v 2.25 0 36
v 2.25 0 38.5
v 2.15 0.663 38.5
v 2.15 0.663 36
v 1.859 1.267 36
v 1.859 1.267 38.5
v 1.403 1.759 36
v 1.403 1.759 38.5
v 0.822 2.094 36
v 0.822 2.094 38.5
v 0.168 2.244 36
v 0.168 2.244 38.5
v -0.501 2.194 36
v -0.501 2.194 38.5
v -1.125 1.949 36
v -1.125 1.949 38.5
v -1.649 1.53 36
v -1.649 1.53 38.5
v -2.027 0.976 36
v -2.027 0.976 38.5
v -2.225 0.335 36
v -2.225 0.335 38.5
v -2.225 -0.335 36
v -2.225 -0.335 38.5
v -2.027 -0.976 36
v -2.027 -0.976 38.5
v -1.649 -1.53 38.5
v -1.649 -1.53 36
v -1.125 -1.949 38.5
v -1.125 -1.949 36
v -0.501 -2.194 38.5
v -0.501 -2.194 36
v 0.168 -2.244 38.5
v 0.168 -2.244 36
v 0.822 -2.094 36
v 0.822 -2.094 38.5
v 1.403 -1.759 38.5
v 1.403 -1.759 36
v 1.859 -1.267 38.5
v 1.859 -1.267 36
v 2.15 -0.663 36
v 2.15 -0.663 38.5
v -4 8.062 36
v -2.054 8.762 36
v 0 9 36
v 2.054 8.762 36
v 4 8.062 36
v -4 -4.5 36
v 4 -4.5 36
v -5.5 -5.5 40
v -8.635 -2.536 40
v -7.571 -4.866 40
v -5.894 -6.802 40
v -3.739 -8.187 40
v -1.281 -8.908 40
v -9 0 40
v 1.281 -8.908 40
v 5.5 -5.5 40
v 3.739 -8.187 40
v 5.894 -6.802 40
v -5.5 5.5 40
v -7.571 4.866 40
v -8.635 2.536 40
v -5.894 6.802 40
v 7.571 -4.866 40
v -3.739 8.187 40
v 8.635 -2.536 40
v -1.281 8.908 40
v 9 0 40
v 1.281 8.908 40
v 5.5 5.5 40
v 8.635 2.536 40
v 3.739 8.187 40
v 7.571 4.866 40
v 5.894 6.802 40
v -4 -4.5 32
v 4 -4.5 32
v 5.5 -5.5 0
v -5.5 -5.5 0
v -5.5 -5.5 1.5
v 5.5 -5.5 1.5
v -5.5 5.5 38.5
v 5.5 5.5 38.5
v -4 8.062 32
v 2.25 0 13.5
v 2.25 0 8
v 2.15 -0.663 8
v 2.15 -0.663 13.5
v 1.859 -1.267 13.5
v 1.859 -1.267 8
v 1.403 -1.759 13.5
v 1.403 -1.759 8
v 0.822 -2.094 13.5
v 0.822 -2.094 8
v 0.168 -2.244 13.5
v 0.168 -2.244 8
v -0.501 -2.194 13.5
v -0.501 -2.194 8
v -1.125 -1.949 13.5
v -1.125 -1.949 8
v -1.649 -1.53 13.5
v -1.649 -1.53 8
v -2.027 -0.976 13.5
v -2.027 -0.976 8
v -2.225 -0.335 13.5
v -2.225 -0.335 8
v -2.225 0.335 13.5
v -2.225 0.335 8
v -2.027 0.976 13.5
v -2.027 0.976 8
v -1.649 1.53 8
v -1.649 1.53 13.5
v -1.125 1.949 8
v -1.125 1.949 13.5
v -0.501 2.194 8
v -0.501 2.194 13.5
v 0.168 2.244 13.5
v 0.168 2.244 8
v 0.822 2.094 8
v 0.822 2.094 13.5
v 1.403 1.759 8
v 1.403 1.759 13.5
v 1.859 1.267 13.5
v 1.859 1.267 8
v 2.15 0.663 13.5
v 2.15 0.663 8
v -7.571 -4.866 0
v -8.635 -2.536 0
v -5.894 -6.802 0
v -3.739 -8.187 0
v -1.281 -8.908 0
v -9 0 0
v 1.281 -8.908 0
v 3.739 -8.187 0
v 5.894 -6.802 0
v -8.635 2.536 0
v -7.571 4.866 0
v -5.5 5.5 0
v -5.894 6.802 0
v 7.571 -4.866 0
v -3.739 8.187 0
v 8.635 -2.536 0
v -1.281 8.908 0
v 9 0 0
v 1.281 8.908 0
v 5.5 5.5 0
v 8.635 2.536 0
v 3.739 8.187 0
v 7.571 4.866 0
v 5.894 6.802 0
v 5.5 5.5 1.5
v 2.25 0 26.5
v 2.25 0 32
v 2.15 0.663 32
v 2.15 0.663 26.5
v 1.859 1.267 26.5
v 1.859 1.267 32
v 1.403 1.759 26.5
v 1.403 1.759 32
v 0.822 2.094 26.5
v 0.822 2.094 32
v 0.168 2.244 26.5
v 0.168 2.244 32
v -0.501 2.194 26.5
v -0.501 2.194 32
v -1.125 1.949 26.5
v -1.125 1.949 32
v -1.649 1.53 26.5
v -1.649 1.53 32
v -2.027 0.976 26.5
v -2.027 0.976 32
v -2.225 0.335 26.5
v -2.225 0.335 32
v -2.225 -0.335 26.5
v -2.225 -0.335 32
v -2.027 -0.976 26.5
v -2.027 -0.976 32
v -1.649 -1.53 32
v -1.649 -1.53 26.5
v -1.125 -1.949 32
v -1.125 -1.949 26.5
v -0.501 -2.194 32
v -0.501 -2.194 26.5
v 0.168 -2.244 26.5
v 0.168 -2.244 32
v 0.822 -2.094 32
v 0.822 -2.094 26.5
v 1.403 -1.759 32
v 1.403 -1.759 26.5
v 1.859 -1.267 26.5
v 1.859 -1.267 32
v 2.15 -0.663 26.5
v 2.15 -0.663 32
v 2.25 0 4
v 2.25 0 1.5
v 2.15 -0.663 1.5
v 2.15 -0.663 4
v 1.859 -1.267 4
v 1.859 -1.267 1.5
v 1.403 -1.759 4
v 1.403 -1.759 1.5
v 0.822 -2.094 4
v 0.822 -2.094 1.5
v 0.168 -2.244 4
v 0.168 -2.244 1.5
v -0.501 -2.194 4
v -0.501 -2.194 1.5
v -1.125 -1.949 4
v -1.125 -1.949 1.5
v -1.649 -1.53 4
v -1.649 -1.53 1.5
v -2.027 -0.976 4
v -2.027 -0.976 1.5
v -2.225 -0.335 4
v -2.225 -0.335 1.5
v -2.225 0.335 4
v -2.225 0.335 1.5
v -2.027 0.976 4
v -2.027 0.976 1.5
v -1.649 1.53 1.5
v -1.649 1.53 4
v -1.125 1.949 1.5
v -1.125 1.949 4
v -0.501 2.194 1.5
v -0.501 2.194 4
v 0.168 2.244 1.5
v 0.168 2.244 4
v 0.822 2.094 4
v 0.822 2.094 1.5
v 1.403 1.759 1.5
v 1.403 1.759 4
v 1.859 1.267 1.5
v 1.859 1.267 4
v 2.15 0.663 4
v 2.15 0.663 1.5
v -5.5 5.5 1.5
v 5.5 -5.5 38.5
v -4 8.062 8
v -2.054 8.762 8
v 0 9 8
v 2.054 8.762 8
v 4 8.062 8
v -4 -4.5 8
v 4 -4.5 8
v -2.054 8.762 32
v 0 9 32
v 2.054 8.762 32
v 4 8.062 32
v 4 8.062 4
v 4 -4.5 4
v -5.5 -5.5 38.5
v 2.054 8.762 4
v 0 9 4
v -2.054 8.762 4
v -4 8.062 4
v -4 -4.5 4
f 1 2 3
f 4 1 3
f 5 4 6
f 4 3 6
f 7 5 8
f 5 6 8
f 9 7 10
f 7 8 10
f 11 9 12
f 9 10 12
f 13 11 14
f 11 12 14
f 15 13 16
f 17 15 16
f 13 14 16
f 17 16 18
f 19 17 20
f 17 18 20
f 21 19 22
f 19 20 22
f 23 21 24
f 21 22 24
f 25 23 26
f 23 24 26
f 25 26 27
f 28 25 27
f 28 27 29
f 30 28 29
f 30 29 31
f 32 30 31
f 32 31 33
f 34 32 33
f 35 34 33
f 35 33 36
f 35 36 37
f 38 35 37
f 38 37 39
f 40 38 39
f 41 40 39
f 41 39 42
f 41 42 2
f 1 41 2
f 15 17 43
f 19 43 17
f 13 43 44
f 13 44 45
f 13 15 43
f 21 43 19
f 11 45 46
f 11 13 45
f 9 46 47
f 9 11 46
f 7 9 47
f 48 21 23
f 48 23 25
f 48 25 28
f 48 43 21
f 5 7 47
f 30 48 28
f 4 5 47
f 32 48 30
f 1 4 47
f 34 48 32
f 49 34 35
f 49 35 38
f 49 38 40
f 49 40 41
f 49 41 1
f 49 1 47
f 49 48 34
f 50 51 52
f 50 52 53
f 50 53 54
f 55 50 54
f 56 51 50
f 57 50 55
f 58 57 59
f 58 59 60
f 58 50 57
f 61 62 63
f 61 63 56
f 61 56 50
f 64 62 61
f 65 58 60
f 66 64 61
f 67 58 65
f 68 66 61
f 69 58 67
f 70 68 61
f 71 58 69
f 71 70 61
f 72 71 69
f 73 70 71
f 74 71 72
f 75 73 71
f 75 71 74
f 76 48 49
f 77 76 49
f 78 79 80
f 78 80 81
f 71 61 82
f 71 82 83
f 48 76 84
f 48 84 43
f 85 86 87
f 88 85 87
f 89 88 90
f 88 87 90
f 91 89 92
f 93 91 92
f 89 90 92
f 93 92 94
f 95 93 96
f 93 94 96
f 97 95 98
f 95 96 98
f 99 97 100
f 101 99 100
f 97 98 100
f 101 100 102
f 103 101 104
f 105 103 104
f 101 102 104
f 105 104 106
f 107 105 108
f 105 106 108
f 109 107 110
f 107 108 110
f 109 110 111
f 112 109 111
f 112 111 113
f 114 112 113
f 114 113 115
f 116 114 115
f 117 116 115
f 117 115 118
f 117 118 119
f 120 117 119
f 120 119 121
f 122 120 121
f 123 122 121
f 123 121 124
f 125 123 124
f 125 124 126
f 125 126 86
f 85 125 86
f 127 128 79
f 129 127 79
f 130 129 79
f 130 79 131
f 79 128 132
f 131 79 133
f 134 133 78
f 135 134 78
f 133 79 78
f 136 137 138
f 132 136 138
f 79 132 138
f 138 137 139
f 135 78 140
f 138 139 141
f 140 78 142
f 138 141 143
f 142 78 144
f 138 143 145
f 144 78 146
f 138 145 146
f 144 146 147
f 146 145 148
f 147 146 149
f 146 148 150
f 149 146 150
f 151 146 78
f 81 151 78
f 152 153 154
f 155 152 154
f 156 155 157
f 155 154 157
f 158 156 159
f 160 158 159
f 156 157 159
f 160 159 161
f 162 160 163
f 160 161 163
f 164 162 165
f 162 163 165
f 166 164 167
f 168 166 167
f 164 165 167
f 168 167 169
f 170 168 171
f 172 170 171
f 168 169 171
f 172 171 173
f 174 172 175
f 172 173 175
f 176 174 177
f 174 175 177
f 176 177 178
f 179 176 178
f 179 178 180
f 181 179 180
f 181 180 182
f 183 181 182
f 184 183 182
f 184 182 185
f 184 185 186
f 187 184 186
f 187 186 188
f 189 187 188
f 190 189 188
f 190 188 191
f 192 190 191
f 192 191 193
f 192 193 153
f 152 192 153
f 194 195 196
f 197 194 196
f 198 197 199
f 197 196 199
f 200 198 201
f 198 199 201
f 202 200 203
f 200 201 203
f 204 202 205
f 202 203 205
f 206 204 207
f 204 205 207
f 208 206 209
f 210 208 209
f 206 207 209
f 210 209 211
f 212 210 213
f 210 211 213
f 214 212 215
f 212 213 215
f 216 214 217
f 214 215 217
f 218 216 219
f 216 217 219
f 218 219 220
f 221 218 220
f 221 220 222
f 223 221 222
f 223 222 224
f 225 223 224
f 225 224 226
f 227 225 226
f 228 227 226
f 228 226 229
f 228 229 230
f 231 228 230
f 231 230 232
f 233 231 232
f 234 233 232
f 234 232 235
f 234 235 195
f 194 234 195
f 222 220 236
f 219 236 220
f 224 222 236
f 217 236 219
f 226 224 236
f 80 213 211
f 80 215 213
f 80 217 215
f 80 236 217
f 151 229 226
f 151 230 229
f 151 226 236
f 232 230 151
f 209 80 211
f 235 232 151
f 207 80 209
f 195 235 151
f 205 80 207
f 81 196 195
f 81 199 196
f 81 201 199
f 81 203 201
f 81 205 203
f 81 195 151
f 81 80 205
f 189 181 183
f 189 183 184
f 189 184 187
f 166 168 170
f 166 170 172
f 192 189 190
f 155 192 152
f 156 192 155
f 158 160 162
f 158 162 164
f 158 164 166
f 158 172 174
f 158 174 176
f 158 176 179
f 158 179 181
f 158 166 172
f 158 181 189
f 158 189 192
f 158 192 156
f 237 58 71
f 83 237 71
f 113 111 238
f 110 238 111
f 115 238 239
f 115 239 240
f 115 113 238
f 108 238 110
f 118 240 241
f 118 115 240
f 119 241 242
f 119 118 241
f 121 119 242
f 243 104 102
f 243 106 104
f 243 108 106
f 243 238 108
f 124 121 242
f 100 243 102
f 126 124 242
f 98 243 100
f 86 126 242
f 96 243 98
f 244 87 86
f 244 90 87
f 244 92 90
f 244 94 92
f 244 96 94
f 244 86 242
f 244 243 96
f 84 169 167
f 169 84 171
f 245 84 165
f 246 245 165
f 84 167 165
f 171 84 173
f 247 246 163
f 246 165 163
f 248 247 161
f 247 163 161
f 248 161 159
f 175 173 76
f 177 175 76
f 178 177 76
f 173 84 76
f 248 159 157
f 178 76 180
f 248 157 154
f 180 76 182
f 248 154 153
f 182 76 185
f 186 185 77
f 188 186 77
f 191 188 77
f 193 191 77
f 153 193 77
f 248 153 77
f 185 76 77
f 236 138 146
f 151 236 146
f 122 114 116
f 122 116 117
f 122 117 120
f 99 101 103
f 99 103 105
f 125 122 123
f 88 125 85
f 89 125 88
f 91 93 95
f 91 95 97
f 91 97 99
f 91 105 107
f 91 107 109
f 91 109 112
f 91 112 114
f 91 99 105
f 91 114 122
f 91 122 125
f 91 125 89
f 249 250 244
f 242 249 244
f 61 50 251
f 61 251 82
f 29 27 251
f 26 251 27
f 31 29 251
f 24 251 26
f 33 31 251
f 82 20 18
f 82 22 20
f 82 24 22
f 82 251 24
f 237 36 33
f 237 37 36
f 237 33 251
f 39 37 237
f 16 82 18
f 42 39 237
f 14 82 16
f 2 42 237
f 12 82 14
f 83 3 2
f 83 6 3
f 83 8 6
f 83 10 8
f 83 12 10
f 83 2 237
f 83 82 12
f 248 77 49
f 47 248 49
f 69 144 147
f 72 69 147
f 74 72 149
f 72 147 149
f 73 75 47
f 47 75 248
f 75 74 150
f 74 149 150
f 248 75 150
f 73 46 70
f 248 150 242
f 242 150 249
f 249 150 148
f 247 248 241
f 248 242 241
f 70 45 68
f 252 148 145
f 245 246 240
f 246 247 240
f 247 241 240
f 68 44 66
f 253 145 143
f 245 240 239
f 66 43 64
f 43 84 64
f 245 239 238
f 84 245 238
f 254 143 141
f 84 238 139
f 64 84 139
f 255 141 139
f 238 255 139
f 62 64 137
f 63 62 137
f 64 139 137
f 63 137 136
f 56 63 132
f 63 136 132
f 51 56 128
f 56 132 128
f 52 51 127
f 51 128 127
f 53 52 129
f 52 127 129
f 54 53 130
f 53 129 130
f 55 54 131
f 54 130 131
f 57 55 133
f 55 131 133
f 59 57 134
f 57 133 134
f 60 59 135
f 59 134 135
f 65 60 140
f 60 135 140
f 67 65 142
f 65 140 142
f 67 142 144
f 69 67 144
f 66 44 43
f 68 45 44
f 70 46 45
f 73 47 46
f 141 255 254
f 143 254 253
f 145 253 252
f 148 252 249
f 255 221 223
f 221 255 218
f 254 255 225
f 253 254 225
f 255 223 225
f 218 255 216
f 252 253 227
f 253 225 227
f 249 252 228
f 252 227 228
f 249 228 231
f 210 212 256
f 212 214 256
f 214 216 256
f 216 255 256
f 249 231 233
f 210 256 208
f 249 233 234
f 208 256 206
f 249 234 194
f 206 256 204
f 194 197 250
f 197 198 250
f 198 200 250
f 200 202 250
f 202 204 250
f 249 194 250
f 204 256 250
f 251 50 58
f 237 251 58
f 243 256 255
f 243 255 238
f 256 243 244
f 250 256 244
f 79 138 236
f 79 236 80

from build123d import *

# Parameters (mm, degrees)
SKETCH_R        = 9
PAD_DEPTH       = 40
SKETCH001_W     = 11
SKETCH001_H     = 11
POCKET_DEPTH    = 1.5
SKETCH002_W     = 11
SKETCH002_H     = 11
POCKET001_DEPTH = 1.5
SKETCH003_R     = 2.25
POCKET002_DEPTH = 12
SKETCH004_R     = 2.25
POCKET003_DEPTH = 12
SKETCH005_W     = 8
SKETCH005_H     = 4
POCKET004_DEPTH = 20


with BuildPart() as part:
    # Sketch → Pad (new body)
    with BuildSketch(Plane.XY):
        Circle(SKETCH_R)
    extrude(amount=PAD_DEPTH)

    # Sketch001 (on Face3 of Pad) → Pocket (cut)
    with BuildSketch(Plane.XY.offset(40)):
        Rectangle(SKETCH001_W, SKETCH001_H)
    extrude(amount=-POCKET_DEPTH, mode=Mode.SUBTRACT)

    # Sketch002 (on Face2 of Pocket) → Pocket001 (cut)
    with BuildSketch(Plane(origin=(0, 0, 0), x_dir=(1, 0, 0), z_dir=(0, 0, -1))):
        Rectangle(SKETCH002_W, SKETCH002_H)
    extrude(amount=-POCKET001_DEPTH, mode=Mode.SUBTRACT)

    # Sketch003 (on Face12 of Pocket001) → Pocket002 (cut)
    with BuildSketch(Plane(origin=(0, 0, 1.5), x_dir=(1, 0, 0), z_dir=(0, 0, -1))):
        Circle(SKETCH003_R)
    extrude(amount=-POCKET002_DEPTH, mode=Mode.SUBTRACT)

    # Sketch004 (on Face13 of Pocket001) → Pocket003 (cut)
    with BuildSketch(Plane.XY.offset(38.5)):
        Circle(SKETCH004_R)
    extrude(amount=-POCKET003_DEPTH, mode=Mode.SUBTRACT)

    # Sketch005 → Pocket004 (cut)
    with BuildSketch(Plane.XZ.offset(4.5)):
        with Locations((0, 6)):
            Rectangle(SKETCH005_W, SKETCH005_H)
        with Locations((0, 34)):
            Rectangle(SKETCH005_W, SKETCH005_H)
    extrude(amount=-POCKET004_DEPTH, mode=Mode.SUBTRACT)


solid = part.part
